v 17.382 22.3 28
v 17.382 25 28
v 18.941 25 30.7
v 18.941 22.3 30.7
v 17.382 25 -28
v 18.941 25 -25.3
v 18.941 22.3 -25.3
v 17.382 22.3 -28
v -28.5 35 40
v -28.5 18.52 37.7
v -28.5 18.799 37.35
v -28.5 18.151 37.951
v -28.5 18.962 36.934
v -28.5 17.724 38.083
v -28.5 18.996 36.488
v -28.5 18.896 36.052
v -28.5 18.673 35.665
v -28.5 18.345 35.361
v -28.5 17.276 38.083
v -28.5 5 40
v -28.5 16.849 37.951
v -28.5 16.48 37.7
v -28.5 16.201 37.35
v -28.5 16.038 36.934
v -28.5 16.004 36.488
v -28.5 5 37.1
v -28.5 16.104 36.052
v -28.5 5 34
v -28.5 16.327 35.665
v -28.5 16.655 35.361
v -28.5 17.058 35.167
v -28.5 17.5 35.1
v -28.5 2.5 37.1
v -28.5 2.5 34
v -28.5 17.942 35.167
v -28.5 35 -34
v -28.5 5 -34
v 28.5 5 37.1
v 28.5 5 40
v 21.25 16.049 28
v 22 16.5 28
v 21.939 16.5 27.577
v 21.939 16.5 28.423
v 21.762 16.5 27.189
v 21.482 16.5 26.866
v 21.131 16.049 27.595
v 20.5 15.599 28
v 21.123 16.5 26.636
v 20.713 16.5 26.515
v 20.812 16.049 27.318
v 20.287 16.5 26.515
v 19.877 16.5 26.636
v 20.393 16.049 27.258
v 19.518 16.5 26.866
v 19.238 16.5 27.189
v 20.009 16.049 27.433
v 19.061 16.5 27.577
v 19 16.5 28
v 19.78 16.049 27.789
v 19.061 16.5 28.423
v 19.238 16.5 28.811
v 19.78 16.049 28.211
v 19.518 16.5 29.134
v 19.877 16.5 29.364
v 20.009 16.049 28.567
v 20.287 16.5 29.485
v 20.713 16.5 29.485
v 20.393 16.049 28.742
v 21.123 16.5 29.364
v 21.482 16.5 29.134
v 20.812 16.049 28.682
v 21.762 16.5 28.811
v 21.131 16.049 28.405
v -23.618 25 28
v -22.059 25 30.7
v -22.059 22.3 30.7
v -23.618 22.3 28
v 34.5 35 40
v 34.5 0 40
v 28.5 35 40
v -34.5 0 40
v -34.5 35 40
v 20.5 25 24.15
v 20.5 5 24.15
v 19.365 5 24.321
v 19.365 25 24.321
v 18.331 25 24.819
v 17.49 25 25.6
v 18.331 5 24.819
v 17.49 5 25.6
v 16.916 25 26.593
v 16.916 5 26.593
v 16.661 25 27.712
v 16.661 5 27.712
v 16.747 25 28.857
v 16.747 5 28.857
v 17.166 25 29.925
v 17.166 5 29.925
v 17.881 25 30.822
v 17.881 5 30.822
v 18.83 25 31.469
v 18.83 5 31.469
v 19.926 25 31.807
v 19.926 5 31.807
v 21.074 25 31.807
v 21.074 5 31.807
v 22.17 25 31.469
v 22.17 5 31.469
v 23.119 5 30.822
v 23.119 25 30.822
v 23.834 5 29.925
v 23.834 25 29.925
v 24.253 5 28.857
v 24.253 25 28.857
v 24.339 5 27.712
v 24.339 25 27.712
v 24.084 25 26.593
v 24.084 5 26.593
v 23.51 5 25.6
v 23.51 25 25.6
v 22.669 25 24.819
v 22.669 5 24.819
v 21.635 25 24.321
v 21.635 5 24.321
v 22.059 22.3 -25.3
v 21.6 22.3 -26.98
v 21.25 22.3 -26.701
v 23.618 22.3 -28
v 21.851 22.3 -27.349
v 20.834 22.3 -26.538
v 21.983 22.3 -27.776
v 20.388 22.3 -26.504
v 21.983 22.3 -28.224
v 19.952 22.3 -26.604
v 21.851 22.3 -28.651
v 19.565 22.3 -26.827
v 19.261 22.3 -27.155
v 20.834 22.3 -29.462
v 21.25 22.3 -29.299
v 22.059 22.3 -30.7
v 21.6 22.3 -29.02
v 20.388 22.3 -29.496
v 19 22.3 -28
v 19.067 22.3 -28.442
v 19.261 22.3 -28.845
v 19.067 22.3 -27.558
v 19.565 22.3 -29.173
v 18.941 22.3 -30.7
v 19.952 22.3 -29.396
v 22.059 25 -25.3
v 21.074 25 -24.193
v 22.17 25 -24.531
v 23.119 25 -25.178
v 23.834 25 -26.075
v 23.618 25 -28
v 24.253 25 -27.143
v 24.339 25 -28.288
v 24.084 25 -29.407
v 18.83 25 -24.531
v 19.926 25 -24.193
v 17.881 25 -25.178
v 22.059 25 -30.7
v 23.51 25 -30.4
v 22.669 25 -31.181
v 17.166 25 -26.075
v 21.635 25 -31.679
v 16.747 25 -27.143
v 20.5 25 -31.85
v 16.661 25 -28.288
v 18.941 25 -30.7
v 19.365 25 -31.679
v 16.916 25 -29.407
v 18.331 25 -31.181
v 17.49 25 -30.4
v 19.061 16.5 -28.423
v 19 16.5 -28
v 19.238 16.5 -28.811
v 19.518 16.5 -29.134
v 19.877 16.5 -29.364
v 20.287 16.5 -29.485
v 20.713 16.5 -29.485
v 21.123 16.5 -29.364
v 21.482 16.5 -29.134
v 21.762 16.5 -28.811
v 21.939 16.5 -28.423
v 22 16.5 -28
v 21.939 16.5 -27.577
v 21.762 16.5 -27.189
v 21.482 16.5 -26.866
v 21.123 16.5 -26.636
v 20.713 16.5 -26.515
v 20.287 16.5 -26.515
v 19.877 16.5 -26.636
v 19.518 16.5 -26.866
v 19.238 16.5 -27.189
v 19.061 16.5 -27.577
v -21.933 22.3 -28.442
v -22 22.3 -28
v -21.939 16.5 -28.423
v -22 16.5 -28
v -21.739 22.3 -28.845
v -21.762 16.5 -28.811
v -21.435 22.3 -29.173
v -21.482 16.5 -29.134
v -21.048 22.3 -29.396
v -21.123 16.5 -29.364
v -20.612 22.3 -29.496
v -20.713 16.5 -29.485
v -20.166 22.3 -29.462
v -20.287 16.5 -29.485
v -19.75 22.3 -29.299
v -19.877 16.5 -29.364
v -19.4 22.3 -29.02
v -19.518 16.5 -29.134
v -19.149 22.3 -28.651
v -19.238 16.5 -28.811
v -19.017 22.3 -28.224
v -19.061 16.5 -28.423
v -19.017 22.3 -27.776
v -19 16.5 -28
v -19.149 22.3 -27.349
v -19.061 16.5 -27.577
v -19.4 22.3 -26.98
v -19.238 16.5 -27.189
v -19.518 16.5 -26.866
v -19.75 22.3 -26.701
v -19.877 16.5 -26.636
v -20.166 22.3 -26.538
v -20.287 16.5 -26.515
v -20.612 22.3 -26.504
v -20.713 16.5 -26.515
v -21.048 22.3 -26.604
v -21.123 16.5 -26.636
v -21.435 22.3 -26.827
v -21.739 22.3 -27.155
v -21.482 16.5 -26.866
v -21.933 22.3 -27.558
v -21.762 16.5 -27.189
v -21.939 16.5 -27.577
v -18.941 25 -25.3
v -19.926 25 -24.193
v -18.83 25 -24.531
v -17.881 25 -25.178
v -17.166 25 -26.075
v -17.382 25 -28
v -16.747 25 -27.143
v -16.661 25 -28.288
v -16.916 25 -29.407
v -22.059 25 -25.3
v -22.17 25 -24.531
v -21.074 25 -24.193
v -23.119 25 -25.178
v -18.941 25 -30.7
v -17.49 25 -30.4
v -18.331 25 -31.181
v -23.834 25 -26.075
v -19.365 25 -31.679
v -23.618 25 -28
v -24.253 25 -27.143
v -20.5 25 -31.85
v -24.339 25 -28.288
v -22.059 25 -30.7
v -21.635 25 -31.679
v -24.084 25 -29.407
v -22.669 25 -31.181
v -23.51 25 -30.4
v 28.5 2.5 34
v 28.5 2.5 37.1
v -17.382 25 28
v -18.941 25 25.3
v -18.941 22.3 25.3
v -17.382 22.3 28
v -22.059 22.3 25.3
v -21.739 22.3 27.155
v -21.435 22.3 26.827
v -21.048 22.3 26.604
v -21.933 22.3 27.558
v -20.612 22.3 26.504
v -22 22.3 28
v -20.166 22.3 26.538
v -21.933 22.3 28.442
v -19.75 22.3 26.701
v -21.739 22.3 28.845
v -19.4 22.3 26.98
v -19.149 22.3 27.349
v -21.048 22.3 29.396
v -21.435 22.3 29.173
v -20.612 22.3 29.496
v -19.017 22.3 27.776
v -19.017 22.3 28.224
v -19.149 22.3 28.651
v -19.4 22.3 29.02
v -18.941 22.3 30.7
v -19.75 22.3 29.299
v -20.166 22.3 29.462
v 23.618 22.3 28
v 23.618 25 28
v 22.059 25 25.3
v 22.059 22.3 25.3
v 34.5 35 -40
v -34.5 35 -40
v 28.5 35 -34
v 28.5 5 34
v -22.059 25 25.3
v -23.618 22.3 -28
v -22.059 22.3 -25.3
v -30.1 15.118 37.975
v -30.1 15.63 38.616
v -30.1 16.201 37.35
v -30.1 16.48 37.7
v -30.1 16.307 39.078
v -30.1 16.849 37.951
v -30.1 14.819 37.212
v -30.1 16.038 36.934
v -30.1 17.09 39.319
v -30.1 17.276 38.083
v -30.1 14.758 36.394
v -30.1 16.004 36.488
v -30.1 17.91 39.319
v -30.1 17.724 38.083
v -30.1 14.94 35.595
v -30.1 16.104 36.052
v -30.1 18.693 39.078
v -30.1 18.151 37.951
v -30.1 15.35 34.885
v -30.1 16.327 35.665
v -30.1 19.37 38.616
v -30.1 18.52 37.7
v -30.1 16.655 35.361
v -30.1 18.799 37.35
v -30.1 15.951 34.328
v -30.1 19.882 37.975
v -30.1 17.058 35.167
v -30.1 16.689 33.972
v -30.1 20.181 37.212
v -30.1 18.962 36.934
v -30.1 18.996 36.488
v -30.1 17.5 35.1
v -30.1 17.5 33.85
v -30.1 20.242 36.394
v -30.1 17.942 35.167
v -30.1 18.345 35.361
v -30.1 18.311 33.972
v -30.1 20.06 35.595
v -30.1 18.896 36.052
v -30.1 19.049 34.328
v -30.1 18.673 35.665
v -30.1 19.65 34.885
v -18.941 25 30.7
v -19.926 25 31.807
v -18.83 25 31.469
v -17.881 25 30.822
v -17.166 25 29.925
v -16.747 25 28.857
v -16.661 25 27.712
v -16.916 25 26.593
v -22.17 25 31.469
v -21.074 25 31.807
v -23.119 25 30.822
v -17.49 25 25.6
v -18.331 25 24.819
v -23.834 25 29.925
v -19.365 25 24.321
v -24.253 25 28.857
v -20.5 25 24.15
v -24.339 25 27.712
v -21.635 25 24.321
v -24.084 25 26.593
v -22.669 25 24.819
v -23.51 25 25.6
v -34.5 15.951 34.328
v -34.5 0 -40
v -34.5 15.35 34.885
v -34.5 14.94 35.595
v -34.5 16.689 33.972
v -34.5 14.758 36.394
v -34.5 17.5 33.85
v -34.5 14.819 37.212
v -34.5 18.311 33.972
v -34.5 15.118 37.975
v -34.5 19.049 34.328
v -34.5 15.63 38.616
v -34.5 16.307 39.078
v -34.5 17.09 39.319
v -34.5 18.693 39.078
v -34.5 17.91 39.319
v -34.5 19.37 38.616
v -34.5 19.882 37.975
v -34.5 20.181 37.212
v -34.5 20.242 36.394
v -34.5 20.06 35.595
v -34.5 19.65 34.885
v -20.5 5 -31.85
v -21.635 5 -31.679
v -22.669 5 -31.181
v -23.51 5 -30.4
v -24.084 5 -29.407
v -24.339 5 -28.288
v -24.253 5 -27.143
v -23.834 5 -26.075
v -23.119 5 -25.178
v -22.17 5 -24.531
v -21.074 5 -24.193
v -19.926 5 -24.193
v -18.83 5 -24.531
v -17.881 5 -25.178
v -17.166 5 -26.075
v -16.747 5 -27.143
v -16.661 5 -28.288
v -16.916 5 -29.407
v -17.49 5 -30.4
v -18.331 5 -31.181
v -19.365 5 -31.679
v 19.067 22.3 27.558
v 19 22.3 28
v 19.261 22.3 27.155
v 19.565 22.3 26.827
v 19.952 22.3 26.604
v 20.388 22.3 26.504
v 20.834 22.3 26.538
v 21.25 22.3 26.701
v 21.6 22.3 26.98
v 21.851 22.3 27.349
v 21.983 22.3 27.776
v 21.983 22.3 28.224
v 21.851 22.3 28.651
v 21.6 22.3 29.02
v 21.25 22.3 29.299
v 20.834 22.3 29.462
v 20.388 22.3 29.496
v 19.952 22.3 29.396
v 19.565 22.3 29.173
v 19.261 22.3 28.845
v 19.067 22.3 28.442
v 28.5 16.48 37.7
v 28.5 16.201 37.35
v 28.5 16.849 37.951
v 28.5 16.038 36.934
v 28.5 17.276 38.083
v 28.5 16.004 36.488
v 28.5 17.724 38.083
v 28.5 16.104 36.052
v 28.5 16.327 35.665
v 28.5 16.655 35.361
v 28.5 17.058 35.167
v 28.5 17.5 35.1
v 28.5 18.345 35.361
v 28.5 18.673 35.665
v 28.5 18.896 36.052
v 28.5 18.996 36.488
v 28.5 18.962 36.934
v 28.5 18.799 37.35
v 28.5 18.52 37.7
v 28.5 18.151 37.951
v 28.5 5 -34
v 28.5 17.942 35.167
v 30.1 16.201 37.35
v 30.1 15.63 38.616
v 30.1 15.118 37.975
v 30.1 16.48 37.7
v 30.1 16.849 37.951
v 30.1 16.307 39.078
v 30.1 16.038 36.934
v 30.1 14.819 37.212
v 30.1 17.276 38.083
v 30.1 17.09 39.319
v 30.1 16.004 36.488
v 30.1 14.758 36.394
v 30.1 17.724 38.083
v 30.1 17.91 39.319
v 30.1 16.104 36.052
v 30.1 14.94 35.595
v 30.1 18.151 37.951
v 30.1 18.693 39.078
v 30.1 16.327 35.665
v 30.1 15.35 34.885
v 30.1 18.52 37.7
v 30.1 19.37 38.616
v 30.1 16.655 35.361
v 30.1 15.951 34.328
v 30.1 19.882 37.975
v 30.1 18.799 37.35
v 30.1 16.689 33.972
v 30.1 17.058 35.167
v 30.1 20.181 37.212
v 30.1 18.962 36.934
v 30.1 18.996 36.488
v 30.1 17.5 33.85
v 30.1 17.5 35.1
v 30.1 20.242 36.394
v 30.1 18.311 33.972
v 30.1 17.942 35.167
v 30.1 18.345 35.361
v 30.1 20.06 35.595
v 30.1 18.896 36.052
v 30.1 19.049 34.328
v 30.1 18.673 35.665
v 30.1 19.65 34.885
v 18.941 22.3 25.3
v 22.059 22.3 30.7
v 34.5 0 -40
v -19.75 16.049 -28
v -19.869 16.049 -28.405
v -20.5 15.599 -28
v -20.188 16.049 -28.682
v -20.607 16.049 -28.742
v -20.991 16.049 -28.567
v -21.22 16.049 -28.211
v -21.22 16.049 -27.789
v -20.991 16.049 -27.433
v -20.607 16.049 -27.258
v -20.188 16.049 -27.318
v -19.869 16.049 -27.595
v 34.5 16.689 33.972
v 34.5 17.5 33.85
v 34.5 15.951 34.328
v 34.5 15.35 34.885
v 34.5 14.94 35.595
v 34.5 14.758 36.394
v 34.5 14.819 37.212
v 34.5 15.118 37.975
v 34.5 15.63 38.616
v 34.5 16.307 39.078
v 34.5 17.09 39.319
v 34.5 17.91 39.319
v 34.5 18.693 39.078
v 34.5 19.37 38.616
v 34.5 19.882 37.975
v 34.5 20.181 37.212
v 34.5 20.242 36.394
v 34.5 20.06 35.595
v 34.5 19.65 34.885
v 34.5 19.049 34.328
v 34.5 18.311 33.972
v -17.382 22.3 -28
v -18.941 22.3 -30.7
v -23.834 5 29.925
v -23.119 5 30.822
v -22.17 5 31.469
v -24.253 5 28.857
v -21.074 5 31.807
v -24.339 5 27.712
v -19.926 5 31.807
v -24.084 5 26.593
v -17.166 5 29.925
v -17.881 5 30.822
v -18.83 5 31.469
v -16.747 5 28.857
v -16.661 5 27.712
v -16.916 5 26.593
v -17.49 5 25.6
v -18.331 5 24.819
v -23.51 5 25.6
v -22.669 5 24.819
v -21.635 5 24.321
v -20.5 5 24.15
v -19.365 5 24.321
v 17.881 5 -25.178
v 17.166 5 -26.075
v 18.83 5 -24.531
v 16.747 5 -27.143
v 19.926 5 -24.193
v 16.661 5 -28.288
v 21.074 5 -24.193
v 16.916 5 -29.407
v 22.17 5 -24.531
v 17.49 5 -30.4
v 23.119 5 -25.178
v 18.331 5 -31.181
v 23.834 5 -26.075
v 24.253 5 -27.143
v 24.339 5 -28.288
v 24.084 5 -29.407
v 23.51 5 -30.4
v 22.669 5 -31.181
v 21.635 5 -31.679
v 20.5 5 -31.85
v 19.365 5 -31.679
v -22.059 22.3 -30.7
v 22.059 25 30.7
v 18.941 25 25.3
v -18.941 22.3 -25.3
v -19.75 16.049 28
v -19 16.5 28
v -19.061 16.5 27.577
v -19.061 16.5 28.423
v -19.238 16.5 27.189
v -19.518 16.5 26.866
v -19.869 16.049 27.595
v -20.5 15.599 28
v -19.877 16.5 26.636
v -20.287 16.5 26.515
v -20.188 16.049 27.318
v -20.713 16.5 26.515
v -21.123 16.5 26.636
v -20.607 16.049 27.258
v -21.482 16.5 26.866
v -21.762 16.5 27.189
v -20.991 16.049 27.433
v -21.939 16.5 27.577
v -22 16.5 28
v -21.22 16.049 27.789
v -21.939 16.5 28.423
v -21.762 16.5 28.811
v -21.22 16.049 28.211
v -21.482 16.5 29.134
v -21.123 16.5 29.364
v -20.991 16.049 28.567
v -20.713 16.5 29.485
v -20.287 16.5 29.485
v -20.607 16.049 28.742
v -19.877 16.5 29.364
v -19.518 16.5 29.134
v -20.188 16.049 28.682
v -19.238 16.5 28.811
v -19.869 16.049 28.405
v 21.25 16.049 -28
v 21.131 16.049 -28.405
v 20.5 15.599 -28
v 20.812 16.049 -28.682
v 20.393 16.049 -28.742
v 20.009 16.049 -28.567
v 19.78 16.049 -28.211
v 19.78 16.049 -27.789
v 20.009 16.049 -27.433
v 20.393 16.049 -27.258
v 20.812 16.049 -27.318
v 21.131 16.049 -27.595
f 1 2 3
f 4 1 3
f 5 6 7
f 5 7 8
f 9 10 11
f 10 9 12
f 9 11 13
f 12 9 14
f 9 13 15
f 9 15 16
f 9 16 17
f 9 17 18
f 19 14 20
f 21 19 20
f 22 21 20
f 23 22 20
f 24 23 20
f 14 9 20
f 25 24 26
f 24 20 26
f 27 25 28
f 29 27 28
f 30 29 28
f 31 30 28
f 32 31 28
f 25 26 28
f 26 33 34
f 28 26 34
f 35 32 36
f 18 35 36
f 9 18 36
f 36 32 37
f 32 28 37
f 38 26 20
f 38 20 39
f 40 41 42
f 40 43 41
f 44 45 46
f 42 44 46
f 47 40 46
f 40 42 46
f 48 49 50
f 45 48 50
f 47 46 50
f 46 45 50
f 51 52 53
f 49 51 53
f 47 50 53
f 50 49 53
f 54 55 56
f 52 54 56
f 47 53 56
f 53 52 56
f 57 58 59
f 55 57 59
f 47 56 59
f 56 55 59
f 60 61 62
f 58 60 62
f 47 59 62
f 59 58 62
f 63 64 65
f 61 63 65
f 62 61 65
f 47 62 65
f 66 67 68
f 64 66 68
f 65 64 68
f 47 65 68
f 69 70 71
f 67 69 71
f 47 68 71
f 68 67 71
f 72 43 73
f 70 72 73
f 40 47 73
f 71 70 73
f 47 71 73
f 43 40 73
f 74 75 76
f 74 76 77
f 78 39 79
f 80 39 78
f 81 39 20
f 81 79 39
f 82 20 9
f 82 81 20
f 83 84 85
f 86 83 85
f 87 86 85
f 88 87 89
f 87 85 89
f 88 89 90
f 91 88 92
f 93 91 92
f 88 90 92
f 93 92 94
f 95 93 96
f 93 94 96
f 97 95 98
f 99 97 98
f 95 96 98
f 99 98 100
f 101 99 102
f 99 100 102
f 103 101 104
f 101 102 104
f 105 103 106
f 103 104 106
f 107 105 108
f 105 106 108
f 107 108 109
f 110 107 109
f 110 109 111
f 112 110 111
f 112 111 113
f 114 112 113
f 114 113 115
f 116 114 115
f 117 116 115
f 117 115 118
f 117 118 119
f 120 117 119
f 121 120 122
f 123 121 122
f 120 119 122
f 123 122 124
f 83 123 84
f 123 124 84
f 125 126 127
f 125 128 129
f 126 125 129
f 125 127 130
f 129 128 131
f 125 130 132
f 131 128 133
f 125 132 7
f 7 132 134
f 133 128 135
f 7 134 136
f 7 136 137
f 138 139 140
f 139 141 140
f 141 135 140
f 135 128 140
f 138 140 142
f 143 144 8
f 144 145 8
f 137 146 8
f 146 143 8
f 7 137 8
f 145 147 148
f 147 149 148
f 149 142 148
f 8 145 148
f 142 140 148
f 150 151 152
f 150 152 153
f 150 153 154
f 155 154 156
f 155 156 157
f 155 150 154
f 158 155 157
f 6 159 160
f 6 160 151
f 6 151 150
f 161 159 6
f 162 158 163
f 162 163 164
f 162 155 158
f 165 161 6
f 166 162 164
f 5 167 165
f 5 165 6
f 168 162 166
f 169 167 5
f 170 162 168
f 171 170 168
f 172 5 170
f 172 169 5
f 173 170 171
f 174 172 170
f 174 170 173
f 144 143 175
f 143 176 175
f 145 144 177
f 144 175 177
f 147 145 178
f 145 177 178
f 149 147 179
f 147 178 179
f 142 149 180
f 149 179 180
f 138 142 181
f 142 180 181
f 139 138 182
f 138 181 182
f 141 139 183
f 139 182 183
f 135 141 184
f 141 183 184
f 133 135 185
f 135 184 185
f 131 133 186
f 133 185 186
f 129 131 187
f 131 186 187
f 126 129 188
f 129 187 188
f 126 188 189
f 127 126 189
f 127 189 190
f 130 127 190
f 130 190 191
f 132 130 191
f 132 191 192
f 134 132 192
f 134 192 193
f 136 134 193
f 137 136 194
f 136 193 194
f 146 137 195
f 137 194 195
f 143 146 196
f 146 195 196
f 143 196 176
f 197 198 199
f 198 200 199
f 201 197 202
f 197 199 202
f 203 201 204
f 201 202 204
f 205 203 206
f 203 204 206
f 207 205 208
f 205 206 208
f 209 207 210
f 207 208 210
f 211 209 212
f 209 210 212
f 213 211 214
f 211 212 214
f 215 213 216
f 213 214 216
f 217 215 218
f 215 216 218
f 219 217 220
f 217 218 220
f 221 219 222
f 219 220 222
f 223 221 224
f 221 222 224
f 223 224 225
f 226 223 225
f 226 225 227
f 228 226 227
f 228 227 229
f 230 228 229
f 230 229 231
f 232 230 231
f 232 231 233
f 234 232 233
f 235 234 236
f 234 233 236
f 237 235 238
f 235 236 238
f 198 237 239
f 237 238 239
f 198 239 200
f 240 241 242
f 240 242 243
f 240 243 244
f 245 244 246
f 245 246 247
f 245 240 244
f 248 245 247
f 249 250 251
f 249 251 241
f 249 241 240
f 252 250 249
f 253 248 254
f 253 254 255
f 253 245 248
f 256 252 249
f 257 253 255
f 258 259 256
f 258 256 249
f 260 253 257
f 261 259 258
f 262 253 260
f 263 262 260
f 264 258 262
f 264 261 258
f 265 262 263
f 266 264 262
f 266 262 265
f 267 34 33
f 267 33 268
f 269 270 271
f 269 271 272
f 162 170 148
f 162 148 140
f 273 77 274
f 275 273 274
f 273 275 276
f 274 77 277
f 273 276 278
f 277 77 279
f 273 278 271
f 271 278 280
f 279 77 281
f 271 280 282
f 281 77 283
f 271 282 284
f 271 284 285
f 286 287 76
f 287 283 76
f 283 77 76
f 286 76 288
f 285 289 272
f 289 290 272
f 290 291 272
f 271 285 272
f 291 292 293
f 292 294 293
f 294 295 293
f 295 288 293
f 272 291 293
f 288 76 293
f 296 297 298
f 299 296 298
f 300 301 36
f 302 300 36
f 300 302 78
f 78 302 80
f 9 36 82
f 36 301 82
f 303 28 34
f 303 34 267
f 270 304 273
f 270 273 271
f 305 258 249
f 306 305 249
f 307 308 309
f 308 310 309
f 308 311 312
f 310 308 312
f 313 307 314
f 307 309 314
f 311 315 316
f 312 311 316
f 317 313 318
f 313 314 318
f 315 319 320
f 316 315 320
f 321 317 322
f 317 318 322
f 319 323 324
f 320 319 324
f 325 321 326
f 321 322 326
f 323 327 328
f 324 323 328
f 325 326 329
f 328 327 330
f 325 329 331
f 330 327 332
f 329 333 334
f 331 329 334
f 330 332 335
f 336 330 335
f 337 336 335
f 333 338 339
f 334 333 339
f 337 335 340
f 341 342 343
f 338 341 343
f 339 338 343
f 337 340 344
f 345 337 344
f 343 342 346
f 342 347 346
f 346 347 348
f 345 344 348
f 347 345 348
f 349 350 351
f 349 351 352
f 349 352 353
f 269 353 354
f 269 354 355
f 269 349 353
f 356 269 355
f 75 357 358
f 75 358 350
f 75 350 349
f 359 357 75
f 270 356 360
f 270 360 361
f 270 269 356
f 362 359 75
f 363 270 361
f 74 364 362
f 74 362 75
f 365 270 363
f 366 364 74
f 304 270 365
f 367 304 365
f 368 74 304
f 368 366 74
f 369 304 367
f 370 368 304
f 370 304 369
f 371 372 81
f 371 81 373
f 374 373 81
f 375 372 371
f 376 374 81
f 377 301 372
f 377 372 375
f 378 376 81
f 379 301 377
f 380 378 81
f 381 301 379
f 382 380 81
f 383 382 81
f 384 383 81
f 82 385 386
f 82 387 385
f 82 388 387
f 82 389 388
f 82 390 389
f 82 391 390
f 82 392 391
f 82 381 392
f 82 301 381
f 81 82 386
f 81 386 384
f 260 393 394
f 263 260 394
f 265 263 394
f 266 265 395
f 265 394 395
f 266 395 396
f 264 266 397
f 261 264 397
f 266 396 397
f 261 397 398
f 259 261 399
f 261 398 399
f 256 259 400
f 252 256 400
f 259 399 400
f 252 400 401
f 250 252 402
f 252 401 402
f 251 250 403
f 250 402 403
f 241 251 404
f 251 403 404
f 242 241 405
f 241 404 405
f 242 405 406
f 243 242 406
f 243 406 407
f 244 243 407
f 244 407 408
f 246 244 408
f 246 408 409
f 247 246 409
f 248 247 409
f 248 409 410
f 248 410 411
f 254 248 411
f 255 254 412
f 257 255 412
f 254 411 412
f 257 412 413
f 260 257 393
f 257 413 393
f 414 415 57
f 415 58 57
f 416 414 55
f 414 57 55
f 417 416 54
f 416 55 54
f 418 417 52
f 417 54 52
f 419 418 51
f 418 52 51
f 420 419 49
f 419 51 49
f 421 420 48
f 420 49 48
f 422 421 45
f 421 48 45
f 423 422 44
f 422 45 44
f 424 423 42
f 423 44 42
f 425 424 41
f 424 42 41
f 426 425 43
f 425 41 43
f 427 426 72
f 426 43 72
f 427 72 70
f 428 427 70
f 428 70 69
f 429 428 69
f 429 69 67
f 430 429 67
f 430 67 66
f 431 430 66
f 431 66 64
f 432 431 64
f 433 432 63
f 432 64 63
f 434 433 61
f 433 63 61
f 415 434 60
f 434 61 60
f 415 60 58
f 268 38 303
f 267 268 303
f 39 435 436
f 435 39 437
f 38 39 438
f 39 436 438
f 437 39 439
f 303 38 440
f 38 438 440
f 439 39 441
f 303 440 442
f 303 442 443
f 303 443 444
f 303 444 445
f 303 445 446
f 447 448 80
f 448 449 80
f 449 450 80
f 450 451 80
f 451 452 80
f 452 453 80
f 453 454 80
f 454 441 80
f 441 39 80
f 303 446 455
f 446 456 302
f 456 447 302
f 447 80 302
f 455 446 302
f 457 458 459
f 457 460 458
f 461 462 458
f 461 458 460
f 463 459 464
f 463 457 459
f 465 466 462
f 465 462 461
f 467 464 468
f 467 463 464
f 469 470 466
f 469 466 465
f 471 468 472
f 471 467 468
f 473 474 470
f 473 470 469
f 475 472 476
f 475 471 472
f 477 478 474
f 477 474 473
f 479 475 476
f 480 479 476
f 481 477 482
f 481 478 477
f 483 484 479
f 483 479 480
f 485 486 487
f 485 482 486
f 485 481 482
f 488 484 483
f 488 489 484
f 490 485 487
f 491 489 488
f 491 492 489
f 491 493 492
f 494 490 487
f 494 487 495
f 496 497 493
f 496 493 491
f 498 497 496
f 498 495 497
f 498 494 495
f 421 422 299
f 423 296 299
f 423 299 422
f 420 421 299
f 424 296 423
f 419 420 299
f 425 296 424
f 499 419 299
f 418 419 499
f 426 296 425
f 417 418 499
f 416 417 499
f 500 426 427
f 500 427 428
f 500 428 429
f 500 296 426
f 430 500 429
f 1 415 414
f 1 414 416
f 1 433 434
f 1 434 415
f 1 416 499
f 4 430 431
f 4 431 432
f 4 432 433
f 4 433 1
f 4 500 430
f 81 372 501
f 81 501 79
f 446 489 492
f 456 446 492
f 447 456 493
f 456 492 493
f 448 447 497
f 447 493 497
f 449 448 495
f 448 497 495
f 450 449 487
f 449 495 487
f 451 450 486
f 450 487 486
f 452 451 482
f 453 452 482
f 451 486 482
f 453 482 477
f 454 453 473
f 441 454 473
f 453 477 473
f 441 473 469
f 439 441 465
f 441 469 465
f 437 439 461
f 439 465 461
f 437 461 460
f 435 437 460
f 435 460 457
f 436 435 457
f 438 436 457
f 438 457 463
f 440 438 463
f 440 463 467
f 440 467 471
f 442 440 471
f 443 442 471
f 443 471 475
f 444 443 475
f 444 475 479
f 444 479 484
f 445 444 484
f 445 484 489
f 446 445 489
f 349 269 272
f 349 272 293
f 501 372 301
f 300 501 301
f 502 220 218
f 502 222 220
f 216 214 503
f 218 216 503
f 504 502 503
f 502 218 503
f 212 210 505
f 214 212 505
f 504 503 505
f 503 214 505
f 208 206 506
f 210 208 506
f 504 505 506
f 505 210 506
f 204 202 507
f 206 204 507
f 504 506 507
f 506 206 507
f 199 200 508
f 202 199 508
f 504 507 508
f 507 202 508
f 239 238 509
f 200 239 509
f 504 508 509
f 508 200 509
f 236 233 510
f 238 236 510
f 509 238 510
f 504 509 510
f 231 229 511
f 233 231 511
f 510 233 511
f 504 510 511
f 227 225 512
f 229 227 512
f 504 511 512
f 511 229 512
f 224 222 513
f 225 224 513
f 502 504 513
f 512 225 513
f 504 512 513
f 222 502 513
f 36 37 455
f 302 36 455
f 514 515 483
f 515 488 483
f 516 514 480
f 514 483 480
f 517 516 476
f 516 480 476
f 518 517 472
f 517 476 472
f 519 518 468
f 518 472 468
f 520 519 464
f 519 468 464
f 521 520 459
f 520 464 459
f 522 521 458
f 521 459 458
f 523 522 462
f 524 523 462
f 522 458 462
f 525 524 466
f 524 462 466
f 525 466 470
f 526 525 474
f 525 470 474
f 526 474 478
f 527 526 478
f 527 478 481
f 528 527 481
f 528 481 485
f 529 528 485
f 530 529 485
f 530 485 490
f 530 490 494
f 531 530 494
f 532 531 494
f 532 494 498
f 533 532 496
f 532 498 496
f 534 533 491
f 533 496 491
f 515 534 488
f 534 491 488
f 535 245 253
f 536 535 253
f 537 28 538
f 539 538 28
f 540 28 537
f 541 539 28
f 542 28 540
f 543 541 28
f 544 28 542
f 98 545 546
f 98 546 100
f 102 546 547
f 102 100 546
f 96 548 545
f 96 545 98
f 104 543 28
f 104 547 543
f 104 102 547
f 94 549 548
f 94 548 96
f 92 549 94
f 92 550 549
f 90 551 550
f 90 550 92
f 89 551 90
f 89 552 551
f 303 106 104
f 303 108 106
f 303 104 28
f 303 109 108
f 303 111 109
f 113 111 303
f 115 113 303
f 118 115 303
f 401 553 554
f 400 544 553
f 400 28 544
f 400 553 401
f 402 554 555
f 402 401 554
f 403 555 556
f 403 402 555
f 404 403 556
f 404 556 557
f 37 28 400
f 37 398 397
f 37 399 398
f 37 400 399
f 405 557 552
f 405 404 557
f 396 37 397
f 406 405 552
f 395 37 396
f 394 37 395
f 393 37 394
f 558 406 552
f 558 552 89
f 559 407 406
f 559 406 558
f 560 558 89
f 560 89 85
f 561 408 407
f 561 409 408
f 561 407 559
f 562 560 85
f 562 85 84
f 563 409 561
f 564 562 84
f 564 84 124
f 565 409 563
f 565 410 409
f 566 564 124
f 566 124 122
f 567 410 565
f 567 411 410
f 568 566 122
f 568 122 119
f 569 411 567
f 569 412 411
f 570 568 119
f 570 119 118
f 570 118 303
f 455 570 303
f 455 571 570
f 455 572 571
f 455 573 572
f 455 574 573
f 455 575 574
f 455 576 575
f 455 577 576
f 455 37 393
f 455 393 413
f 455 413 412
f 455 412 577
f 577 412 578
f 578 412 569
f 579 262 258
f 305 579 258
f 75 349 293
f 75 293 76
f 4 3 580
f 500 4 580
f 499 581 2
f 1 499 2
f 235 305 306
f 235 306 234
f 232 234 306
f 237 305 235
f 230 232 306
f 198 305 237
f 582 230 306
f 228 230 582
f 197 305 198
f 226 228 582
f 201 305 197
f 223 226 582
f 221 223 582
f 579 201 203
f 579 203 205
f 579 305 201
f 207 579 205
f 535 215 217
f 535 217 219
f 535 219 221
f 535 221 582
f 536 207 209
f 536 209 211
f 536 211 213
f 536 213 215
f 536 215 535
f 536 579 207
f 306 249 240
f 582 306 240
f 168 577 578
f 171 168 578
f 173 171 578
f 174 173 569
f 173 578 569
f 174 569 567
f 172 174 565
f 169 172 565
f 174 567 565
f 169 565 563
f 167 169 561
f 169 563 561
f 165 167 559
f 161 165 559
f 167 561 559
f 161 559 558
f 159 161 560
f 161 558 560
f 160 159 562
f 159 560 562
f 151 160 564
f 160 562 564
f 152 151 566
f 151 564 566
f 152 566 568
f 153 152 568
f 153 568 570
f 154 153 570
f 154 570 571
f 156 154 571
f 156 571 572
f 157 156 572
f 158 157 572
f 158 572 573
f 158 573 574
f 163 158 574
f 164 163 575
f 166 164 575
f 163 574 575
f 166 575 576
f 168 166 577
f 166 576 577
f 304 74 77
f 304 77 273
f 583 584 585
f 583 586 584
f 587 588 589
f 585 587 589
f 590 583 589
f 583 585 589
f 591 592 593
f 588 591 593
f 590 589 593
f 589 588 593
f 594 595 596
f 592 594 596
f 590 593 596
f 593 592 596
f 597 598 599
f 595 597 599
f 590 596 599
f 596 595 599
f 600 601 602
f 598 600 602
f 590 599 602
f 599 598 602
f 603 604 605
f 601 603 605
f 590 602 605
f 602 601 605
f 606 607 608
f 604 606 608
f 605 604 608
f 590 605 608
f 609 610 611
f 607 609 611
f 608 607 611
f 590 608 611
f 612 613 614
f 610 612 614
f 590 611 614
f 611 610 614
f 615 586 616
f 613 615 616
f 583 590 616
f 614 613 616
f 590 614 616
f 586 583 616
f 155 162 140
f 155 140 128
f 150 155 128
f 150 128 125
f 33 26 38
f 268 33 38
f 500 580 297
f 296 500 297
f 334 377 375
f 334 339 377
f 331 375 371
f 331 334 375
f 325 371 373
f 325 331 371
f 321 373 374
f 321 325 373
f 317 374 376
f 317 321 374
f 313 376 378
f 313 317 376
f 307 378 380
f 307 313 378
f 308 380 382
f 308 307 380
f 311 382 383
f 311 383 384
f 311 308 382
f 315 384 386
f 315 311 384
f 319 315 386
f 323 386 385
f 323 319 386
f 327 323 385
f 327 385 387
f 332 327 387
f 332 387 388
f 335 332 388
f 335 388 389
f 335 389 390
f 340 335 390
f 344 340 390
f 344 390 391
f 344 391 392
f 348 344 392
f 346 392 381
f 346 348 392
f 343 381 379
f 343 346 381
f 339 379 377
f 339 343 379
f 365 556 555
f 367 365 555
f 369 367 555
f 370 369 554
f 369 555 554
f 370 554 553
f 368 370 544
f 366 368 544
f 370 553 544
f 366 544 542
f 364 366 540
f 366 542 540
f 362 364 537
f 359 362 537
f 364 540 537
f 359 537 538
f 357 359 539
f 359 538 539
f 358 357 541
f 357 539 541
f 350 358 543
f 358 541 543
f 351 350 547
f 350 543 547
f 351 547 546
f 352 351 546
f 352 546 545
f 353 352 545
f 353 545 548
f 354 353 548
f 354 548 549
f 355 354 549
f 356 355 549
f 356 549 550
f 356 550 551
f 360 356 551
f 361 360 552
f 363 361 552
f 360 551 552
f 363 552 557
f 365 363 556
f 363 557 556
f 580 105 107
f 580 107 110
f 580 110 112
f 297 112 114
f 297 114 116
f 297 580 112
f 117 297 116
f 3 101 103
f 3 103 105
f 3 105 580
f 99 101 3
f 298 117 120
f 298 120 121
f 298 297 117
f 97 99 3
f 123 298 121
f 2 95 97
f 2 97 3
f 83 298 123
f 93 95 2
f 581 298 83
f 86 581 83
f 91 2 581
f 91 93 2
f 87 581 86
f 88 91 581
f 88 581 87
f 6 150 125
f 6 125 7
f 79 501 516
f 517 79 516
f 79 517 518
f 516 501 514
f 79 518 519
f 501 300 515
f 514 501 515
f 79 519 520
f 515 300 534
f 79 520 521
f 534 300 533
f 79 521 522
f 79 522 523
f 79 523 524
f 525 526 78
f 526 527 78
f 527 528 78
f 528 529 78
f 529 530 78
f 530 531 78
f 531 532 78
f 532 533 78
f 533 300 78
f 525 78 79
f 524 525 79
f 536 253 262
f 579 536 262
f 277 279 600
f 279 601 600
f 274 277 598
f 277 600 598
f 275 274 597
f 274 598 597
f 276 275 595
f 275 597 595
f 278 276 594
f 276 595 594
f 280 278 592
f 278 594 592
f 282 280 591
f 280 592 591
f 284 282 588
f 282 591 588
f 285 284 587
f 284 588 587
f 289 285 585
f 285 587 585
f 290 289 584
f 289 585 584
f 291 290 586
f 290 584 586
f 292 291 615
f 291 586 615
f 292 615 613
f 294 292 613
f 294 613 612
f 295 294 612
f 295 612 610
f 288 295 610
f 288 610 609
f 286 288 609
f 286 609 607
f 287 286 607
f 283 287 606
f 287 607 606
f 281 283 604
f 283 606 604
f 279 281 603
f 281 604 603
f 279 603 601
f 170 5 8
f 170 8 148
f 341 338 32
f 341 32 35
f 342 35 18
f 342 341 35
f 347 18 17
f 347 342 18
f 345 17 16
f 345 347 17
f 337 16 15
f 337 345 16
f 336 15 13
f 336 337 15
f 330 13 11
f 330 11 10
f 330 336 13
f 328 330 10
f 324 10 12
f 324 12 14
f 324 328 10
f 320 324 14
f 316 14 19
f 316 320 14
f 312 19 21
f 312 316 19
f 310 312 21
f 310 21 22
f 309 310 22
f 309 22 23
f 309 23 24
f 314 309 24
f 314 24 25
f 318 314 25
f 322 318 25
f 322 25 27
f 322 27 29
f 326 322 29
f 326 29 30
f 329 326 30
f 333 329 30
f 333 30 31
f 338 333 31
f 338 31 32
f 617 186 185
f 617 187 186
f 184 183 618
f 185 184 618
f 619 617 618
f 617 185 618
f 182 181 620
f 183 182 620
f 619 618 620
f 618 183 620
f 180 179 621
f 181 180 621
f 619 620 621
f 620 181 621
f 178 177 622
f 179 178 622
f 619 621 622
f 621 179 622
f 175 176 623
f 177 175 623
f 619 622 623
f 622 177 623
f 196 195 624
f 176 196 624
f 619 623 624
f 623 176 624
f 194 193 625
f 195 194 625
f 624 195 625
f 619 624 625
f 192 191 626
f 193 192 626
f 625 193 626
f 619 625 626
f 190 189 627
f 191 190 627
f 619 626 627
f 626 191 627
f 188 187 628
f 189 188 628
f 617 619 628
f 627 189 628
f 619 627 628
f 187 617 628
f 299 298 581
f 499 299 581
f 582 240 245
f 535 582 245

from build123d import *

# Parameters (mm, degrees)
SKETCH1_W                                = 65
SKETCH1_H                                = 80
BOSS_EXTRUDE1_DEPTH                      = 5
SKETCH2_W                                = 65
SKETCH2_H                                = 80
SKETCH2_W_2                              = 57
SKETCH2_H_2                              = 68
BOSS_EXTRUDE2_DEPTH                      = 30
SKETCH3_R                                = 3.85
BOSS_EXTRUDE3_DEPTH                      = 20
F_3_0MM_DOWEL_HOLE1_D                    = 3
F_3_0MM_DOWEL_HOLE1_DEPTH                = 8.5
F_3_0MM_DOWEL_HOLE1_CSINK_D              = 3.05
F_3_0MM_DOWEL_HOLE1_CSINK_ANGLE          = 90
F_3_0MM_DOWEL_HOLE1_TIP                  = 0.901290929
CUT_EXTRUDE1_DEPTH                       = 2.7
MIRROR1_AT_THE_SECOND_PLANE_COPY_1_DEPTH = 2.7
SKETCH13_R                               = 2.75
CUT_EXTRUDE4_DEPTH                       = 2.4
SKETCH14_R                               = 1.5
CUT_EXTRUDE5_DEPTH                       = 4
SKETCH11_W                               = 57
SKETCH11_H                               = 6
CUT_EXTRUDE2_DEPTH                       = 30
SKETCH15_W                               = 57
SKETCH15_H                               = 3.1
CUT_EXTRUDE6_DEPTH                       = 2.5
SKETCH16_W                               = 80
SKETCH16_H                               = 35
SKETCH16_R                               = 2.75
BOSS_EXTRUDE4_DEPTH                      = 2


with BuildPart() as part:
    # Sketch1 → Boss-Extrude1 (new body)
    with BuildSketch(Plane(origin=(0, 0, 0), x_dir=(1, 0, 0), z_dir=(0, 1, 0))):
        Rectangle(SKETCH1_W, SKETCH1_H)
    extrude(amount=BOSS_EXTRUDE1_DEPTH)

    # Sketch2 → Boss-Extrude2 (add)
    with BuildSketch(Plane(origin=(0, 5, 0), x_dir=(1, 0, 0), z_dir=(0, 1, 0))):
        Rectangle(SKETCH2_W, SKETCH2_H)
        Rectangle(SKETCH2_W_2, SKETCH2_H_2, mode=Mode.SUBTRACT)
    extrude(amount=BOSS_EXTRUDE2_DEPTH)

    # Sketch3 → Boss-Extrude3 (add)
    with BuildSketch(Plane(origin=(0, 5, 0), x_dir=(1, 0, 0), z_dir=(0, 1, 0))):
        with Locations(Location((-20.5, -28, 0), (0, 0, 90))):
            Circle(SKETCH3_R)
        with Locations(Location((20.5, -28, 0), (0, 0, 90))):
            Circle(SKETCH3_R)
        with Locations(Location((20.5, 28, 0), (0, 0, 90))):
            Circle(SKETCH3_R)
        with Locations(Location((-20.5, 28, 0), (0, 0, 90))):
            Circle(SKETCH3_R)
    extrude(amount=BOSS_EXTRUDE3_DEPTH)

    # Ø3.0mm Dowel Hole1
    with Locations(Plane(origin=(0, 25, 0), x_dir=(1, 0, 0), z_dir=(0, 1, 0))):
        with Locations((-20.5, 28), (20.5, 28), (20.5, -28), (-20.5, -28)):
            CounterSinkHole(F_3_0MM_DOWEL_HOLE1_D / 2, F_3_0MM_DOWEL_HOLE1_CSINK_D / 2, depth=F_3_0MM_DOWEL_HOLE1_DEPTH, counter_sink_angle=F_3_0MM_DOWEL_HOLE1_CSINK_ANGLE)
            with Locations((0, 0, -(F_3_0MM_DOWEL_HOLE1_DEPTH + F_3_0MM_DOWEL_HOLE1_TIP / 2))):  # 118° drill point
                Cone(0, F_3_0MM_DOWEL_HOLE1_D / 2, F_3_0MM_DOWEL_HOLE1_TIP, mode=Mode.SUBTRACT)

    # Sketch8 → Cut-Extrude1 (cut)
    with BuildSketch(Plane(origin=(0, 25, 0), x_dir=(1, 0, 0), z_dir=(0, 1, 0))):
        Polygon((-17.382308546, 28), (-18.941154273, 30.7), (-22.058845727, 30.7), (-23.617691454, 28), (-22.058845727, 25.3), (-18.941154273, 25.3), align=None)
    cut_extrude1 = extrude(amount=-CUT_EXTRUDE1_DEPTH, mode=Mode.SUBTRACT)

    # Mirror1: Cut-Extrude1 across plane
    add(cut_extrude1.mirror(Plane.XY), mode=Mode.SUBTRACT)

    # Mirror1 at the second plane: Cut-Extrude1 across plane
    add(cut_extrude1.mirror(Plane(origin=(0, 0, 0), x_dir=(0, 0, 1), z_dir=(1, 0, 0))), mode=Mode.SUBTRACT)

    # Mirror1 at the second plane copy 1 sketc → Mirror1 at the second plane copy 1 (cut)
    with BuildSketch(Plane(origin=(0, 25, 0), x_dir=(-1, 0, 0), z_dir=(0, 1, 0))):
        Polygon((-17.382308546, 28), (-18.941154273, 30.7), (-22.058845727, 30.7), (-23.617691454, 28), (-22.058845727, 25.3), (-18.941154273, 25.3), align=None)
    extrude(amount=-MIRROR1_AT_THE_SECOND_PLANE_COPY_1_DEPTH, mode=Mode.SUBTRACT)

    # Sketch13 → Cut-Extrude4 (cut)
    with BuildSketch(Plane(origin=(32.5, 0, 0), x_dir=(0, 0, -1), z_dir=(1, 0, 0))):
        with Locations((-36.6, 17.5)):
            Circle(SKETCH13_R)
    cut_extrude4 = extrude(amount=-CUT_EXTRUDE4_DEPTH, mode=Mode.SUBTRACT)

    # Sketch14 → Cut-Extrude5 (cut)
    with BuildSketch(Plane(origin=(32.5, 0, 0), x_dir=(0, 0, -1), z_dir=(1, 0, 0))):
        with Locations((-36.6, 17.5)):
            Circle(SKETCH14_R)
    cut_extrude5 = extrude(amount=-CUT_EXTRUDE5_DEPTH, mode=Mode.SUBTRACT)

    # Mirror2: Cut-Extrude4, Cut-Extrude5 across plane
    add(cut_extrude4.mirror(Plane(origin=(0, 0, 0), x_dir=(0, 0, 1), z_dir=(1, 0, 0))), mode=Mode.SUBTRACT)
    add(cut_extrude5.mirror(Plane(origin=(0, 0, 0), x_dir=(0, 0, 1), z_dir=(1, 0, 0))), mode=Mode.SUBTRACT)

    # Sketch11 → Cut-Extrude2 (cut)
    with BuildSketch(Plane(origin=(0, 35, 0), x_dir=(1, 0, 0), z_dir=(0, 1, 0))):
        with Locations((0, -37)):
            Rectangle(SKETCH11_W, SKETCH11_H)
    extrude(amount=-CUT_EXTRUDE2_DEPTH, mode=Mode.SUBTRACT)

    # Sketch15 → Cut-Extrude6 (cut)
    with BuildSketch(Plane(origin=(0, 5, 0), x_dir=(1, 0, 0), z_dir=(0, 1, 0))):
        with Locations((0, -35.55)):
            Rectangle(SKETCH15_W, SKETCH15_H)
    extrude(amount=-CUT_EXTRUDE6_DEPTH, mode=Mode.SUBTRACT)

    # Sketch16 → Boss-Extrude4 (add)
    with BuildSketch(Plane.ZY.offset(32.5)):
        with Locations((0, 17.5)):
            Rectangle(SKETCH16_W, SKETCH16_H)
        with Locations(Location((36.6, 17.5, 0), (0, 0, 180))):
            Circle(SKETCH16_R, mode=Mode.SUBTRACT)
    boss_extrude4 = extrude(amount=BOSS_EXTRUDE4_DEPTH)

    # Mirror3: Boss-Extrude4 across plane
    add(boss_extrude4.mirror(Plane(origin=(0, 0, 0), x_dir=(0, 0, 1), z_dir=(1, 0, 0))))


solid = part.part
